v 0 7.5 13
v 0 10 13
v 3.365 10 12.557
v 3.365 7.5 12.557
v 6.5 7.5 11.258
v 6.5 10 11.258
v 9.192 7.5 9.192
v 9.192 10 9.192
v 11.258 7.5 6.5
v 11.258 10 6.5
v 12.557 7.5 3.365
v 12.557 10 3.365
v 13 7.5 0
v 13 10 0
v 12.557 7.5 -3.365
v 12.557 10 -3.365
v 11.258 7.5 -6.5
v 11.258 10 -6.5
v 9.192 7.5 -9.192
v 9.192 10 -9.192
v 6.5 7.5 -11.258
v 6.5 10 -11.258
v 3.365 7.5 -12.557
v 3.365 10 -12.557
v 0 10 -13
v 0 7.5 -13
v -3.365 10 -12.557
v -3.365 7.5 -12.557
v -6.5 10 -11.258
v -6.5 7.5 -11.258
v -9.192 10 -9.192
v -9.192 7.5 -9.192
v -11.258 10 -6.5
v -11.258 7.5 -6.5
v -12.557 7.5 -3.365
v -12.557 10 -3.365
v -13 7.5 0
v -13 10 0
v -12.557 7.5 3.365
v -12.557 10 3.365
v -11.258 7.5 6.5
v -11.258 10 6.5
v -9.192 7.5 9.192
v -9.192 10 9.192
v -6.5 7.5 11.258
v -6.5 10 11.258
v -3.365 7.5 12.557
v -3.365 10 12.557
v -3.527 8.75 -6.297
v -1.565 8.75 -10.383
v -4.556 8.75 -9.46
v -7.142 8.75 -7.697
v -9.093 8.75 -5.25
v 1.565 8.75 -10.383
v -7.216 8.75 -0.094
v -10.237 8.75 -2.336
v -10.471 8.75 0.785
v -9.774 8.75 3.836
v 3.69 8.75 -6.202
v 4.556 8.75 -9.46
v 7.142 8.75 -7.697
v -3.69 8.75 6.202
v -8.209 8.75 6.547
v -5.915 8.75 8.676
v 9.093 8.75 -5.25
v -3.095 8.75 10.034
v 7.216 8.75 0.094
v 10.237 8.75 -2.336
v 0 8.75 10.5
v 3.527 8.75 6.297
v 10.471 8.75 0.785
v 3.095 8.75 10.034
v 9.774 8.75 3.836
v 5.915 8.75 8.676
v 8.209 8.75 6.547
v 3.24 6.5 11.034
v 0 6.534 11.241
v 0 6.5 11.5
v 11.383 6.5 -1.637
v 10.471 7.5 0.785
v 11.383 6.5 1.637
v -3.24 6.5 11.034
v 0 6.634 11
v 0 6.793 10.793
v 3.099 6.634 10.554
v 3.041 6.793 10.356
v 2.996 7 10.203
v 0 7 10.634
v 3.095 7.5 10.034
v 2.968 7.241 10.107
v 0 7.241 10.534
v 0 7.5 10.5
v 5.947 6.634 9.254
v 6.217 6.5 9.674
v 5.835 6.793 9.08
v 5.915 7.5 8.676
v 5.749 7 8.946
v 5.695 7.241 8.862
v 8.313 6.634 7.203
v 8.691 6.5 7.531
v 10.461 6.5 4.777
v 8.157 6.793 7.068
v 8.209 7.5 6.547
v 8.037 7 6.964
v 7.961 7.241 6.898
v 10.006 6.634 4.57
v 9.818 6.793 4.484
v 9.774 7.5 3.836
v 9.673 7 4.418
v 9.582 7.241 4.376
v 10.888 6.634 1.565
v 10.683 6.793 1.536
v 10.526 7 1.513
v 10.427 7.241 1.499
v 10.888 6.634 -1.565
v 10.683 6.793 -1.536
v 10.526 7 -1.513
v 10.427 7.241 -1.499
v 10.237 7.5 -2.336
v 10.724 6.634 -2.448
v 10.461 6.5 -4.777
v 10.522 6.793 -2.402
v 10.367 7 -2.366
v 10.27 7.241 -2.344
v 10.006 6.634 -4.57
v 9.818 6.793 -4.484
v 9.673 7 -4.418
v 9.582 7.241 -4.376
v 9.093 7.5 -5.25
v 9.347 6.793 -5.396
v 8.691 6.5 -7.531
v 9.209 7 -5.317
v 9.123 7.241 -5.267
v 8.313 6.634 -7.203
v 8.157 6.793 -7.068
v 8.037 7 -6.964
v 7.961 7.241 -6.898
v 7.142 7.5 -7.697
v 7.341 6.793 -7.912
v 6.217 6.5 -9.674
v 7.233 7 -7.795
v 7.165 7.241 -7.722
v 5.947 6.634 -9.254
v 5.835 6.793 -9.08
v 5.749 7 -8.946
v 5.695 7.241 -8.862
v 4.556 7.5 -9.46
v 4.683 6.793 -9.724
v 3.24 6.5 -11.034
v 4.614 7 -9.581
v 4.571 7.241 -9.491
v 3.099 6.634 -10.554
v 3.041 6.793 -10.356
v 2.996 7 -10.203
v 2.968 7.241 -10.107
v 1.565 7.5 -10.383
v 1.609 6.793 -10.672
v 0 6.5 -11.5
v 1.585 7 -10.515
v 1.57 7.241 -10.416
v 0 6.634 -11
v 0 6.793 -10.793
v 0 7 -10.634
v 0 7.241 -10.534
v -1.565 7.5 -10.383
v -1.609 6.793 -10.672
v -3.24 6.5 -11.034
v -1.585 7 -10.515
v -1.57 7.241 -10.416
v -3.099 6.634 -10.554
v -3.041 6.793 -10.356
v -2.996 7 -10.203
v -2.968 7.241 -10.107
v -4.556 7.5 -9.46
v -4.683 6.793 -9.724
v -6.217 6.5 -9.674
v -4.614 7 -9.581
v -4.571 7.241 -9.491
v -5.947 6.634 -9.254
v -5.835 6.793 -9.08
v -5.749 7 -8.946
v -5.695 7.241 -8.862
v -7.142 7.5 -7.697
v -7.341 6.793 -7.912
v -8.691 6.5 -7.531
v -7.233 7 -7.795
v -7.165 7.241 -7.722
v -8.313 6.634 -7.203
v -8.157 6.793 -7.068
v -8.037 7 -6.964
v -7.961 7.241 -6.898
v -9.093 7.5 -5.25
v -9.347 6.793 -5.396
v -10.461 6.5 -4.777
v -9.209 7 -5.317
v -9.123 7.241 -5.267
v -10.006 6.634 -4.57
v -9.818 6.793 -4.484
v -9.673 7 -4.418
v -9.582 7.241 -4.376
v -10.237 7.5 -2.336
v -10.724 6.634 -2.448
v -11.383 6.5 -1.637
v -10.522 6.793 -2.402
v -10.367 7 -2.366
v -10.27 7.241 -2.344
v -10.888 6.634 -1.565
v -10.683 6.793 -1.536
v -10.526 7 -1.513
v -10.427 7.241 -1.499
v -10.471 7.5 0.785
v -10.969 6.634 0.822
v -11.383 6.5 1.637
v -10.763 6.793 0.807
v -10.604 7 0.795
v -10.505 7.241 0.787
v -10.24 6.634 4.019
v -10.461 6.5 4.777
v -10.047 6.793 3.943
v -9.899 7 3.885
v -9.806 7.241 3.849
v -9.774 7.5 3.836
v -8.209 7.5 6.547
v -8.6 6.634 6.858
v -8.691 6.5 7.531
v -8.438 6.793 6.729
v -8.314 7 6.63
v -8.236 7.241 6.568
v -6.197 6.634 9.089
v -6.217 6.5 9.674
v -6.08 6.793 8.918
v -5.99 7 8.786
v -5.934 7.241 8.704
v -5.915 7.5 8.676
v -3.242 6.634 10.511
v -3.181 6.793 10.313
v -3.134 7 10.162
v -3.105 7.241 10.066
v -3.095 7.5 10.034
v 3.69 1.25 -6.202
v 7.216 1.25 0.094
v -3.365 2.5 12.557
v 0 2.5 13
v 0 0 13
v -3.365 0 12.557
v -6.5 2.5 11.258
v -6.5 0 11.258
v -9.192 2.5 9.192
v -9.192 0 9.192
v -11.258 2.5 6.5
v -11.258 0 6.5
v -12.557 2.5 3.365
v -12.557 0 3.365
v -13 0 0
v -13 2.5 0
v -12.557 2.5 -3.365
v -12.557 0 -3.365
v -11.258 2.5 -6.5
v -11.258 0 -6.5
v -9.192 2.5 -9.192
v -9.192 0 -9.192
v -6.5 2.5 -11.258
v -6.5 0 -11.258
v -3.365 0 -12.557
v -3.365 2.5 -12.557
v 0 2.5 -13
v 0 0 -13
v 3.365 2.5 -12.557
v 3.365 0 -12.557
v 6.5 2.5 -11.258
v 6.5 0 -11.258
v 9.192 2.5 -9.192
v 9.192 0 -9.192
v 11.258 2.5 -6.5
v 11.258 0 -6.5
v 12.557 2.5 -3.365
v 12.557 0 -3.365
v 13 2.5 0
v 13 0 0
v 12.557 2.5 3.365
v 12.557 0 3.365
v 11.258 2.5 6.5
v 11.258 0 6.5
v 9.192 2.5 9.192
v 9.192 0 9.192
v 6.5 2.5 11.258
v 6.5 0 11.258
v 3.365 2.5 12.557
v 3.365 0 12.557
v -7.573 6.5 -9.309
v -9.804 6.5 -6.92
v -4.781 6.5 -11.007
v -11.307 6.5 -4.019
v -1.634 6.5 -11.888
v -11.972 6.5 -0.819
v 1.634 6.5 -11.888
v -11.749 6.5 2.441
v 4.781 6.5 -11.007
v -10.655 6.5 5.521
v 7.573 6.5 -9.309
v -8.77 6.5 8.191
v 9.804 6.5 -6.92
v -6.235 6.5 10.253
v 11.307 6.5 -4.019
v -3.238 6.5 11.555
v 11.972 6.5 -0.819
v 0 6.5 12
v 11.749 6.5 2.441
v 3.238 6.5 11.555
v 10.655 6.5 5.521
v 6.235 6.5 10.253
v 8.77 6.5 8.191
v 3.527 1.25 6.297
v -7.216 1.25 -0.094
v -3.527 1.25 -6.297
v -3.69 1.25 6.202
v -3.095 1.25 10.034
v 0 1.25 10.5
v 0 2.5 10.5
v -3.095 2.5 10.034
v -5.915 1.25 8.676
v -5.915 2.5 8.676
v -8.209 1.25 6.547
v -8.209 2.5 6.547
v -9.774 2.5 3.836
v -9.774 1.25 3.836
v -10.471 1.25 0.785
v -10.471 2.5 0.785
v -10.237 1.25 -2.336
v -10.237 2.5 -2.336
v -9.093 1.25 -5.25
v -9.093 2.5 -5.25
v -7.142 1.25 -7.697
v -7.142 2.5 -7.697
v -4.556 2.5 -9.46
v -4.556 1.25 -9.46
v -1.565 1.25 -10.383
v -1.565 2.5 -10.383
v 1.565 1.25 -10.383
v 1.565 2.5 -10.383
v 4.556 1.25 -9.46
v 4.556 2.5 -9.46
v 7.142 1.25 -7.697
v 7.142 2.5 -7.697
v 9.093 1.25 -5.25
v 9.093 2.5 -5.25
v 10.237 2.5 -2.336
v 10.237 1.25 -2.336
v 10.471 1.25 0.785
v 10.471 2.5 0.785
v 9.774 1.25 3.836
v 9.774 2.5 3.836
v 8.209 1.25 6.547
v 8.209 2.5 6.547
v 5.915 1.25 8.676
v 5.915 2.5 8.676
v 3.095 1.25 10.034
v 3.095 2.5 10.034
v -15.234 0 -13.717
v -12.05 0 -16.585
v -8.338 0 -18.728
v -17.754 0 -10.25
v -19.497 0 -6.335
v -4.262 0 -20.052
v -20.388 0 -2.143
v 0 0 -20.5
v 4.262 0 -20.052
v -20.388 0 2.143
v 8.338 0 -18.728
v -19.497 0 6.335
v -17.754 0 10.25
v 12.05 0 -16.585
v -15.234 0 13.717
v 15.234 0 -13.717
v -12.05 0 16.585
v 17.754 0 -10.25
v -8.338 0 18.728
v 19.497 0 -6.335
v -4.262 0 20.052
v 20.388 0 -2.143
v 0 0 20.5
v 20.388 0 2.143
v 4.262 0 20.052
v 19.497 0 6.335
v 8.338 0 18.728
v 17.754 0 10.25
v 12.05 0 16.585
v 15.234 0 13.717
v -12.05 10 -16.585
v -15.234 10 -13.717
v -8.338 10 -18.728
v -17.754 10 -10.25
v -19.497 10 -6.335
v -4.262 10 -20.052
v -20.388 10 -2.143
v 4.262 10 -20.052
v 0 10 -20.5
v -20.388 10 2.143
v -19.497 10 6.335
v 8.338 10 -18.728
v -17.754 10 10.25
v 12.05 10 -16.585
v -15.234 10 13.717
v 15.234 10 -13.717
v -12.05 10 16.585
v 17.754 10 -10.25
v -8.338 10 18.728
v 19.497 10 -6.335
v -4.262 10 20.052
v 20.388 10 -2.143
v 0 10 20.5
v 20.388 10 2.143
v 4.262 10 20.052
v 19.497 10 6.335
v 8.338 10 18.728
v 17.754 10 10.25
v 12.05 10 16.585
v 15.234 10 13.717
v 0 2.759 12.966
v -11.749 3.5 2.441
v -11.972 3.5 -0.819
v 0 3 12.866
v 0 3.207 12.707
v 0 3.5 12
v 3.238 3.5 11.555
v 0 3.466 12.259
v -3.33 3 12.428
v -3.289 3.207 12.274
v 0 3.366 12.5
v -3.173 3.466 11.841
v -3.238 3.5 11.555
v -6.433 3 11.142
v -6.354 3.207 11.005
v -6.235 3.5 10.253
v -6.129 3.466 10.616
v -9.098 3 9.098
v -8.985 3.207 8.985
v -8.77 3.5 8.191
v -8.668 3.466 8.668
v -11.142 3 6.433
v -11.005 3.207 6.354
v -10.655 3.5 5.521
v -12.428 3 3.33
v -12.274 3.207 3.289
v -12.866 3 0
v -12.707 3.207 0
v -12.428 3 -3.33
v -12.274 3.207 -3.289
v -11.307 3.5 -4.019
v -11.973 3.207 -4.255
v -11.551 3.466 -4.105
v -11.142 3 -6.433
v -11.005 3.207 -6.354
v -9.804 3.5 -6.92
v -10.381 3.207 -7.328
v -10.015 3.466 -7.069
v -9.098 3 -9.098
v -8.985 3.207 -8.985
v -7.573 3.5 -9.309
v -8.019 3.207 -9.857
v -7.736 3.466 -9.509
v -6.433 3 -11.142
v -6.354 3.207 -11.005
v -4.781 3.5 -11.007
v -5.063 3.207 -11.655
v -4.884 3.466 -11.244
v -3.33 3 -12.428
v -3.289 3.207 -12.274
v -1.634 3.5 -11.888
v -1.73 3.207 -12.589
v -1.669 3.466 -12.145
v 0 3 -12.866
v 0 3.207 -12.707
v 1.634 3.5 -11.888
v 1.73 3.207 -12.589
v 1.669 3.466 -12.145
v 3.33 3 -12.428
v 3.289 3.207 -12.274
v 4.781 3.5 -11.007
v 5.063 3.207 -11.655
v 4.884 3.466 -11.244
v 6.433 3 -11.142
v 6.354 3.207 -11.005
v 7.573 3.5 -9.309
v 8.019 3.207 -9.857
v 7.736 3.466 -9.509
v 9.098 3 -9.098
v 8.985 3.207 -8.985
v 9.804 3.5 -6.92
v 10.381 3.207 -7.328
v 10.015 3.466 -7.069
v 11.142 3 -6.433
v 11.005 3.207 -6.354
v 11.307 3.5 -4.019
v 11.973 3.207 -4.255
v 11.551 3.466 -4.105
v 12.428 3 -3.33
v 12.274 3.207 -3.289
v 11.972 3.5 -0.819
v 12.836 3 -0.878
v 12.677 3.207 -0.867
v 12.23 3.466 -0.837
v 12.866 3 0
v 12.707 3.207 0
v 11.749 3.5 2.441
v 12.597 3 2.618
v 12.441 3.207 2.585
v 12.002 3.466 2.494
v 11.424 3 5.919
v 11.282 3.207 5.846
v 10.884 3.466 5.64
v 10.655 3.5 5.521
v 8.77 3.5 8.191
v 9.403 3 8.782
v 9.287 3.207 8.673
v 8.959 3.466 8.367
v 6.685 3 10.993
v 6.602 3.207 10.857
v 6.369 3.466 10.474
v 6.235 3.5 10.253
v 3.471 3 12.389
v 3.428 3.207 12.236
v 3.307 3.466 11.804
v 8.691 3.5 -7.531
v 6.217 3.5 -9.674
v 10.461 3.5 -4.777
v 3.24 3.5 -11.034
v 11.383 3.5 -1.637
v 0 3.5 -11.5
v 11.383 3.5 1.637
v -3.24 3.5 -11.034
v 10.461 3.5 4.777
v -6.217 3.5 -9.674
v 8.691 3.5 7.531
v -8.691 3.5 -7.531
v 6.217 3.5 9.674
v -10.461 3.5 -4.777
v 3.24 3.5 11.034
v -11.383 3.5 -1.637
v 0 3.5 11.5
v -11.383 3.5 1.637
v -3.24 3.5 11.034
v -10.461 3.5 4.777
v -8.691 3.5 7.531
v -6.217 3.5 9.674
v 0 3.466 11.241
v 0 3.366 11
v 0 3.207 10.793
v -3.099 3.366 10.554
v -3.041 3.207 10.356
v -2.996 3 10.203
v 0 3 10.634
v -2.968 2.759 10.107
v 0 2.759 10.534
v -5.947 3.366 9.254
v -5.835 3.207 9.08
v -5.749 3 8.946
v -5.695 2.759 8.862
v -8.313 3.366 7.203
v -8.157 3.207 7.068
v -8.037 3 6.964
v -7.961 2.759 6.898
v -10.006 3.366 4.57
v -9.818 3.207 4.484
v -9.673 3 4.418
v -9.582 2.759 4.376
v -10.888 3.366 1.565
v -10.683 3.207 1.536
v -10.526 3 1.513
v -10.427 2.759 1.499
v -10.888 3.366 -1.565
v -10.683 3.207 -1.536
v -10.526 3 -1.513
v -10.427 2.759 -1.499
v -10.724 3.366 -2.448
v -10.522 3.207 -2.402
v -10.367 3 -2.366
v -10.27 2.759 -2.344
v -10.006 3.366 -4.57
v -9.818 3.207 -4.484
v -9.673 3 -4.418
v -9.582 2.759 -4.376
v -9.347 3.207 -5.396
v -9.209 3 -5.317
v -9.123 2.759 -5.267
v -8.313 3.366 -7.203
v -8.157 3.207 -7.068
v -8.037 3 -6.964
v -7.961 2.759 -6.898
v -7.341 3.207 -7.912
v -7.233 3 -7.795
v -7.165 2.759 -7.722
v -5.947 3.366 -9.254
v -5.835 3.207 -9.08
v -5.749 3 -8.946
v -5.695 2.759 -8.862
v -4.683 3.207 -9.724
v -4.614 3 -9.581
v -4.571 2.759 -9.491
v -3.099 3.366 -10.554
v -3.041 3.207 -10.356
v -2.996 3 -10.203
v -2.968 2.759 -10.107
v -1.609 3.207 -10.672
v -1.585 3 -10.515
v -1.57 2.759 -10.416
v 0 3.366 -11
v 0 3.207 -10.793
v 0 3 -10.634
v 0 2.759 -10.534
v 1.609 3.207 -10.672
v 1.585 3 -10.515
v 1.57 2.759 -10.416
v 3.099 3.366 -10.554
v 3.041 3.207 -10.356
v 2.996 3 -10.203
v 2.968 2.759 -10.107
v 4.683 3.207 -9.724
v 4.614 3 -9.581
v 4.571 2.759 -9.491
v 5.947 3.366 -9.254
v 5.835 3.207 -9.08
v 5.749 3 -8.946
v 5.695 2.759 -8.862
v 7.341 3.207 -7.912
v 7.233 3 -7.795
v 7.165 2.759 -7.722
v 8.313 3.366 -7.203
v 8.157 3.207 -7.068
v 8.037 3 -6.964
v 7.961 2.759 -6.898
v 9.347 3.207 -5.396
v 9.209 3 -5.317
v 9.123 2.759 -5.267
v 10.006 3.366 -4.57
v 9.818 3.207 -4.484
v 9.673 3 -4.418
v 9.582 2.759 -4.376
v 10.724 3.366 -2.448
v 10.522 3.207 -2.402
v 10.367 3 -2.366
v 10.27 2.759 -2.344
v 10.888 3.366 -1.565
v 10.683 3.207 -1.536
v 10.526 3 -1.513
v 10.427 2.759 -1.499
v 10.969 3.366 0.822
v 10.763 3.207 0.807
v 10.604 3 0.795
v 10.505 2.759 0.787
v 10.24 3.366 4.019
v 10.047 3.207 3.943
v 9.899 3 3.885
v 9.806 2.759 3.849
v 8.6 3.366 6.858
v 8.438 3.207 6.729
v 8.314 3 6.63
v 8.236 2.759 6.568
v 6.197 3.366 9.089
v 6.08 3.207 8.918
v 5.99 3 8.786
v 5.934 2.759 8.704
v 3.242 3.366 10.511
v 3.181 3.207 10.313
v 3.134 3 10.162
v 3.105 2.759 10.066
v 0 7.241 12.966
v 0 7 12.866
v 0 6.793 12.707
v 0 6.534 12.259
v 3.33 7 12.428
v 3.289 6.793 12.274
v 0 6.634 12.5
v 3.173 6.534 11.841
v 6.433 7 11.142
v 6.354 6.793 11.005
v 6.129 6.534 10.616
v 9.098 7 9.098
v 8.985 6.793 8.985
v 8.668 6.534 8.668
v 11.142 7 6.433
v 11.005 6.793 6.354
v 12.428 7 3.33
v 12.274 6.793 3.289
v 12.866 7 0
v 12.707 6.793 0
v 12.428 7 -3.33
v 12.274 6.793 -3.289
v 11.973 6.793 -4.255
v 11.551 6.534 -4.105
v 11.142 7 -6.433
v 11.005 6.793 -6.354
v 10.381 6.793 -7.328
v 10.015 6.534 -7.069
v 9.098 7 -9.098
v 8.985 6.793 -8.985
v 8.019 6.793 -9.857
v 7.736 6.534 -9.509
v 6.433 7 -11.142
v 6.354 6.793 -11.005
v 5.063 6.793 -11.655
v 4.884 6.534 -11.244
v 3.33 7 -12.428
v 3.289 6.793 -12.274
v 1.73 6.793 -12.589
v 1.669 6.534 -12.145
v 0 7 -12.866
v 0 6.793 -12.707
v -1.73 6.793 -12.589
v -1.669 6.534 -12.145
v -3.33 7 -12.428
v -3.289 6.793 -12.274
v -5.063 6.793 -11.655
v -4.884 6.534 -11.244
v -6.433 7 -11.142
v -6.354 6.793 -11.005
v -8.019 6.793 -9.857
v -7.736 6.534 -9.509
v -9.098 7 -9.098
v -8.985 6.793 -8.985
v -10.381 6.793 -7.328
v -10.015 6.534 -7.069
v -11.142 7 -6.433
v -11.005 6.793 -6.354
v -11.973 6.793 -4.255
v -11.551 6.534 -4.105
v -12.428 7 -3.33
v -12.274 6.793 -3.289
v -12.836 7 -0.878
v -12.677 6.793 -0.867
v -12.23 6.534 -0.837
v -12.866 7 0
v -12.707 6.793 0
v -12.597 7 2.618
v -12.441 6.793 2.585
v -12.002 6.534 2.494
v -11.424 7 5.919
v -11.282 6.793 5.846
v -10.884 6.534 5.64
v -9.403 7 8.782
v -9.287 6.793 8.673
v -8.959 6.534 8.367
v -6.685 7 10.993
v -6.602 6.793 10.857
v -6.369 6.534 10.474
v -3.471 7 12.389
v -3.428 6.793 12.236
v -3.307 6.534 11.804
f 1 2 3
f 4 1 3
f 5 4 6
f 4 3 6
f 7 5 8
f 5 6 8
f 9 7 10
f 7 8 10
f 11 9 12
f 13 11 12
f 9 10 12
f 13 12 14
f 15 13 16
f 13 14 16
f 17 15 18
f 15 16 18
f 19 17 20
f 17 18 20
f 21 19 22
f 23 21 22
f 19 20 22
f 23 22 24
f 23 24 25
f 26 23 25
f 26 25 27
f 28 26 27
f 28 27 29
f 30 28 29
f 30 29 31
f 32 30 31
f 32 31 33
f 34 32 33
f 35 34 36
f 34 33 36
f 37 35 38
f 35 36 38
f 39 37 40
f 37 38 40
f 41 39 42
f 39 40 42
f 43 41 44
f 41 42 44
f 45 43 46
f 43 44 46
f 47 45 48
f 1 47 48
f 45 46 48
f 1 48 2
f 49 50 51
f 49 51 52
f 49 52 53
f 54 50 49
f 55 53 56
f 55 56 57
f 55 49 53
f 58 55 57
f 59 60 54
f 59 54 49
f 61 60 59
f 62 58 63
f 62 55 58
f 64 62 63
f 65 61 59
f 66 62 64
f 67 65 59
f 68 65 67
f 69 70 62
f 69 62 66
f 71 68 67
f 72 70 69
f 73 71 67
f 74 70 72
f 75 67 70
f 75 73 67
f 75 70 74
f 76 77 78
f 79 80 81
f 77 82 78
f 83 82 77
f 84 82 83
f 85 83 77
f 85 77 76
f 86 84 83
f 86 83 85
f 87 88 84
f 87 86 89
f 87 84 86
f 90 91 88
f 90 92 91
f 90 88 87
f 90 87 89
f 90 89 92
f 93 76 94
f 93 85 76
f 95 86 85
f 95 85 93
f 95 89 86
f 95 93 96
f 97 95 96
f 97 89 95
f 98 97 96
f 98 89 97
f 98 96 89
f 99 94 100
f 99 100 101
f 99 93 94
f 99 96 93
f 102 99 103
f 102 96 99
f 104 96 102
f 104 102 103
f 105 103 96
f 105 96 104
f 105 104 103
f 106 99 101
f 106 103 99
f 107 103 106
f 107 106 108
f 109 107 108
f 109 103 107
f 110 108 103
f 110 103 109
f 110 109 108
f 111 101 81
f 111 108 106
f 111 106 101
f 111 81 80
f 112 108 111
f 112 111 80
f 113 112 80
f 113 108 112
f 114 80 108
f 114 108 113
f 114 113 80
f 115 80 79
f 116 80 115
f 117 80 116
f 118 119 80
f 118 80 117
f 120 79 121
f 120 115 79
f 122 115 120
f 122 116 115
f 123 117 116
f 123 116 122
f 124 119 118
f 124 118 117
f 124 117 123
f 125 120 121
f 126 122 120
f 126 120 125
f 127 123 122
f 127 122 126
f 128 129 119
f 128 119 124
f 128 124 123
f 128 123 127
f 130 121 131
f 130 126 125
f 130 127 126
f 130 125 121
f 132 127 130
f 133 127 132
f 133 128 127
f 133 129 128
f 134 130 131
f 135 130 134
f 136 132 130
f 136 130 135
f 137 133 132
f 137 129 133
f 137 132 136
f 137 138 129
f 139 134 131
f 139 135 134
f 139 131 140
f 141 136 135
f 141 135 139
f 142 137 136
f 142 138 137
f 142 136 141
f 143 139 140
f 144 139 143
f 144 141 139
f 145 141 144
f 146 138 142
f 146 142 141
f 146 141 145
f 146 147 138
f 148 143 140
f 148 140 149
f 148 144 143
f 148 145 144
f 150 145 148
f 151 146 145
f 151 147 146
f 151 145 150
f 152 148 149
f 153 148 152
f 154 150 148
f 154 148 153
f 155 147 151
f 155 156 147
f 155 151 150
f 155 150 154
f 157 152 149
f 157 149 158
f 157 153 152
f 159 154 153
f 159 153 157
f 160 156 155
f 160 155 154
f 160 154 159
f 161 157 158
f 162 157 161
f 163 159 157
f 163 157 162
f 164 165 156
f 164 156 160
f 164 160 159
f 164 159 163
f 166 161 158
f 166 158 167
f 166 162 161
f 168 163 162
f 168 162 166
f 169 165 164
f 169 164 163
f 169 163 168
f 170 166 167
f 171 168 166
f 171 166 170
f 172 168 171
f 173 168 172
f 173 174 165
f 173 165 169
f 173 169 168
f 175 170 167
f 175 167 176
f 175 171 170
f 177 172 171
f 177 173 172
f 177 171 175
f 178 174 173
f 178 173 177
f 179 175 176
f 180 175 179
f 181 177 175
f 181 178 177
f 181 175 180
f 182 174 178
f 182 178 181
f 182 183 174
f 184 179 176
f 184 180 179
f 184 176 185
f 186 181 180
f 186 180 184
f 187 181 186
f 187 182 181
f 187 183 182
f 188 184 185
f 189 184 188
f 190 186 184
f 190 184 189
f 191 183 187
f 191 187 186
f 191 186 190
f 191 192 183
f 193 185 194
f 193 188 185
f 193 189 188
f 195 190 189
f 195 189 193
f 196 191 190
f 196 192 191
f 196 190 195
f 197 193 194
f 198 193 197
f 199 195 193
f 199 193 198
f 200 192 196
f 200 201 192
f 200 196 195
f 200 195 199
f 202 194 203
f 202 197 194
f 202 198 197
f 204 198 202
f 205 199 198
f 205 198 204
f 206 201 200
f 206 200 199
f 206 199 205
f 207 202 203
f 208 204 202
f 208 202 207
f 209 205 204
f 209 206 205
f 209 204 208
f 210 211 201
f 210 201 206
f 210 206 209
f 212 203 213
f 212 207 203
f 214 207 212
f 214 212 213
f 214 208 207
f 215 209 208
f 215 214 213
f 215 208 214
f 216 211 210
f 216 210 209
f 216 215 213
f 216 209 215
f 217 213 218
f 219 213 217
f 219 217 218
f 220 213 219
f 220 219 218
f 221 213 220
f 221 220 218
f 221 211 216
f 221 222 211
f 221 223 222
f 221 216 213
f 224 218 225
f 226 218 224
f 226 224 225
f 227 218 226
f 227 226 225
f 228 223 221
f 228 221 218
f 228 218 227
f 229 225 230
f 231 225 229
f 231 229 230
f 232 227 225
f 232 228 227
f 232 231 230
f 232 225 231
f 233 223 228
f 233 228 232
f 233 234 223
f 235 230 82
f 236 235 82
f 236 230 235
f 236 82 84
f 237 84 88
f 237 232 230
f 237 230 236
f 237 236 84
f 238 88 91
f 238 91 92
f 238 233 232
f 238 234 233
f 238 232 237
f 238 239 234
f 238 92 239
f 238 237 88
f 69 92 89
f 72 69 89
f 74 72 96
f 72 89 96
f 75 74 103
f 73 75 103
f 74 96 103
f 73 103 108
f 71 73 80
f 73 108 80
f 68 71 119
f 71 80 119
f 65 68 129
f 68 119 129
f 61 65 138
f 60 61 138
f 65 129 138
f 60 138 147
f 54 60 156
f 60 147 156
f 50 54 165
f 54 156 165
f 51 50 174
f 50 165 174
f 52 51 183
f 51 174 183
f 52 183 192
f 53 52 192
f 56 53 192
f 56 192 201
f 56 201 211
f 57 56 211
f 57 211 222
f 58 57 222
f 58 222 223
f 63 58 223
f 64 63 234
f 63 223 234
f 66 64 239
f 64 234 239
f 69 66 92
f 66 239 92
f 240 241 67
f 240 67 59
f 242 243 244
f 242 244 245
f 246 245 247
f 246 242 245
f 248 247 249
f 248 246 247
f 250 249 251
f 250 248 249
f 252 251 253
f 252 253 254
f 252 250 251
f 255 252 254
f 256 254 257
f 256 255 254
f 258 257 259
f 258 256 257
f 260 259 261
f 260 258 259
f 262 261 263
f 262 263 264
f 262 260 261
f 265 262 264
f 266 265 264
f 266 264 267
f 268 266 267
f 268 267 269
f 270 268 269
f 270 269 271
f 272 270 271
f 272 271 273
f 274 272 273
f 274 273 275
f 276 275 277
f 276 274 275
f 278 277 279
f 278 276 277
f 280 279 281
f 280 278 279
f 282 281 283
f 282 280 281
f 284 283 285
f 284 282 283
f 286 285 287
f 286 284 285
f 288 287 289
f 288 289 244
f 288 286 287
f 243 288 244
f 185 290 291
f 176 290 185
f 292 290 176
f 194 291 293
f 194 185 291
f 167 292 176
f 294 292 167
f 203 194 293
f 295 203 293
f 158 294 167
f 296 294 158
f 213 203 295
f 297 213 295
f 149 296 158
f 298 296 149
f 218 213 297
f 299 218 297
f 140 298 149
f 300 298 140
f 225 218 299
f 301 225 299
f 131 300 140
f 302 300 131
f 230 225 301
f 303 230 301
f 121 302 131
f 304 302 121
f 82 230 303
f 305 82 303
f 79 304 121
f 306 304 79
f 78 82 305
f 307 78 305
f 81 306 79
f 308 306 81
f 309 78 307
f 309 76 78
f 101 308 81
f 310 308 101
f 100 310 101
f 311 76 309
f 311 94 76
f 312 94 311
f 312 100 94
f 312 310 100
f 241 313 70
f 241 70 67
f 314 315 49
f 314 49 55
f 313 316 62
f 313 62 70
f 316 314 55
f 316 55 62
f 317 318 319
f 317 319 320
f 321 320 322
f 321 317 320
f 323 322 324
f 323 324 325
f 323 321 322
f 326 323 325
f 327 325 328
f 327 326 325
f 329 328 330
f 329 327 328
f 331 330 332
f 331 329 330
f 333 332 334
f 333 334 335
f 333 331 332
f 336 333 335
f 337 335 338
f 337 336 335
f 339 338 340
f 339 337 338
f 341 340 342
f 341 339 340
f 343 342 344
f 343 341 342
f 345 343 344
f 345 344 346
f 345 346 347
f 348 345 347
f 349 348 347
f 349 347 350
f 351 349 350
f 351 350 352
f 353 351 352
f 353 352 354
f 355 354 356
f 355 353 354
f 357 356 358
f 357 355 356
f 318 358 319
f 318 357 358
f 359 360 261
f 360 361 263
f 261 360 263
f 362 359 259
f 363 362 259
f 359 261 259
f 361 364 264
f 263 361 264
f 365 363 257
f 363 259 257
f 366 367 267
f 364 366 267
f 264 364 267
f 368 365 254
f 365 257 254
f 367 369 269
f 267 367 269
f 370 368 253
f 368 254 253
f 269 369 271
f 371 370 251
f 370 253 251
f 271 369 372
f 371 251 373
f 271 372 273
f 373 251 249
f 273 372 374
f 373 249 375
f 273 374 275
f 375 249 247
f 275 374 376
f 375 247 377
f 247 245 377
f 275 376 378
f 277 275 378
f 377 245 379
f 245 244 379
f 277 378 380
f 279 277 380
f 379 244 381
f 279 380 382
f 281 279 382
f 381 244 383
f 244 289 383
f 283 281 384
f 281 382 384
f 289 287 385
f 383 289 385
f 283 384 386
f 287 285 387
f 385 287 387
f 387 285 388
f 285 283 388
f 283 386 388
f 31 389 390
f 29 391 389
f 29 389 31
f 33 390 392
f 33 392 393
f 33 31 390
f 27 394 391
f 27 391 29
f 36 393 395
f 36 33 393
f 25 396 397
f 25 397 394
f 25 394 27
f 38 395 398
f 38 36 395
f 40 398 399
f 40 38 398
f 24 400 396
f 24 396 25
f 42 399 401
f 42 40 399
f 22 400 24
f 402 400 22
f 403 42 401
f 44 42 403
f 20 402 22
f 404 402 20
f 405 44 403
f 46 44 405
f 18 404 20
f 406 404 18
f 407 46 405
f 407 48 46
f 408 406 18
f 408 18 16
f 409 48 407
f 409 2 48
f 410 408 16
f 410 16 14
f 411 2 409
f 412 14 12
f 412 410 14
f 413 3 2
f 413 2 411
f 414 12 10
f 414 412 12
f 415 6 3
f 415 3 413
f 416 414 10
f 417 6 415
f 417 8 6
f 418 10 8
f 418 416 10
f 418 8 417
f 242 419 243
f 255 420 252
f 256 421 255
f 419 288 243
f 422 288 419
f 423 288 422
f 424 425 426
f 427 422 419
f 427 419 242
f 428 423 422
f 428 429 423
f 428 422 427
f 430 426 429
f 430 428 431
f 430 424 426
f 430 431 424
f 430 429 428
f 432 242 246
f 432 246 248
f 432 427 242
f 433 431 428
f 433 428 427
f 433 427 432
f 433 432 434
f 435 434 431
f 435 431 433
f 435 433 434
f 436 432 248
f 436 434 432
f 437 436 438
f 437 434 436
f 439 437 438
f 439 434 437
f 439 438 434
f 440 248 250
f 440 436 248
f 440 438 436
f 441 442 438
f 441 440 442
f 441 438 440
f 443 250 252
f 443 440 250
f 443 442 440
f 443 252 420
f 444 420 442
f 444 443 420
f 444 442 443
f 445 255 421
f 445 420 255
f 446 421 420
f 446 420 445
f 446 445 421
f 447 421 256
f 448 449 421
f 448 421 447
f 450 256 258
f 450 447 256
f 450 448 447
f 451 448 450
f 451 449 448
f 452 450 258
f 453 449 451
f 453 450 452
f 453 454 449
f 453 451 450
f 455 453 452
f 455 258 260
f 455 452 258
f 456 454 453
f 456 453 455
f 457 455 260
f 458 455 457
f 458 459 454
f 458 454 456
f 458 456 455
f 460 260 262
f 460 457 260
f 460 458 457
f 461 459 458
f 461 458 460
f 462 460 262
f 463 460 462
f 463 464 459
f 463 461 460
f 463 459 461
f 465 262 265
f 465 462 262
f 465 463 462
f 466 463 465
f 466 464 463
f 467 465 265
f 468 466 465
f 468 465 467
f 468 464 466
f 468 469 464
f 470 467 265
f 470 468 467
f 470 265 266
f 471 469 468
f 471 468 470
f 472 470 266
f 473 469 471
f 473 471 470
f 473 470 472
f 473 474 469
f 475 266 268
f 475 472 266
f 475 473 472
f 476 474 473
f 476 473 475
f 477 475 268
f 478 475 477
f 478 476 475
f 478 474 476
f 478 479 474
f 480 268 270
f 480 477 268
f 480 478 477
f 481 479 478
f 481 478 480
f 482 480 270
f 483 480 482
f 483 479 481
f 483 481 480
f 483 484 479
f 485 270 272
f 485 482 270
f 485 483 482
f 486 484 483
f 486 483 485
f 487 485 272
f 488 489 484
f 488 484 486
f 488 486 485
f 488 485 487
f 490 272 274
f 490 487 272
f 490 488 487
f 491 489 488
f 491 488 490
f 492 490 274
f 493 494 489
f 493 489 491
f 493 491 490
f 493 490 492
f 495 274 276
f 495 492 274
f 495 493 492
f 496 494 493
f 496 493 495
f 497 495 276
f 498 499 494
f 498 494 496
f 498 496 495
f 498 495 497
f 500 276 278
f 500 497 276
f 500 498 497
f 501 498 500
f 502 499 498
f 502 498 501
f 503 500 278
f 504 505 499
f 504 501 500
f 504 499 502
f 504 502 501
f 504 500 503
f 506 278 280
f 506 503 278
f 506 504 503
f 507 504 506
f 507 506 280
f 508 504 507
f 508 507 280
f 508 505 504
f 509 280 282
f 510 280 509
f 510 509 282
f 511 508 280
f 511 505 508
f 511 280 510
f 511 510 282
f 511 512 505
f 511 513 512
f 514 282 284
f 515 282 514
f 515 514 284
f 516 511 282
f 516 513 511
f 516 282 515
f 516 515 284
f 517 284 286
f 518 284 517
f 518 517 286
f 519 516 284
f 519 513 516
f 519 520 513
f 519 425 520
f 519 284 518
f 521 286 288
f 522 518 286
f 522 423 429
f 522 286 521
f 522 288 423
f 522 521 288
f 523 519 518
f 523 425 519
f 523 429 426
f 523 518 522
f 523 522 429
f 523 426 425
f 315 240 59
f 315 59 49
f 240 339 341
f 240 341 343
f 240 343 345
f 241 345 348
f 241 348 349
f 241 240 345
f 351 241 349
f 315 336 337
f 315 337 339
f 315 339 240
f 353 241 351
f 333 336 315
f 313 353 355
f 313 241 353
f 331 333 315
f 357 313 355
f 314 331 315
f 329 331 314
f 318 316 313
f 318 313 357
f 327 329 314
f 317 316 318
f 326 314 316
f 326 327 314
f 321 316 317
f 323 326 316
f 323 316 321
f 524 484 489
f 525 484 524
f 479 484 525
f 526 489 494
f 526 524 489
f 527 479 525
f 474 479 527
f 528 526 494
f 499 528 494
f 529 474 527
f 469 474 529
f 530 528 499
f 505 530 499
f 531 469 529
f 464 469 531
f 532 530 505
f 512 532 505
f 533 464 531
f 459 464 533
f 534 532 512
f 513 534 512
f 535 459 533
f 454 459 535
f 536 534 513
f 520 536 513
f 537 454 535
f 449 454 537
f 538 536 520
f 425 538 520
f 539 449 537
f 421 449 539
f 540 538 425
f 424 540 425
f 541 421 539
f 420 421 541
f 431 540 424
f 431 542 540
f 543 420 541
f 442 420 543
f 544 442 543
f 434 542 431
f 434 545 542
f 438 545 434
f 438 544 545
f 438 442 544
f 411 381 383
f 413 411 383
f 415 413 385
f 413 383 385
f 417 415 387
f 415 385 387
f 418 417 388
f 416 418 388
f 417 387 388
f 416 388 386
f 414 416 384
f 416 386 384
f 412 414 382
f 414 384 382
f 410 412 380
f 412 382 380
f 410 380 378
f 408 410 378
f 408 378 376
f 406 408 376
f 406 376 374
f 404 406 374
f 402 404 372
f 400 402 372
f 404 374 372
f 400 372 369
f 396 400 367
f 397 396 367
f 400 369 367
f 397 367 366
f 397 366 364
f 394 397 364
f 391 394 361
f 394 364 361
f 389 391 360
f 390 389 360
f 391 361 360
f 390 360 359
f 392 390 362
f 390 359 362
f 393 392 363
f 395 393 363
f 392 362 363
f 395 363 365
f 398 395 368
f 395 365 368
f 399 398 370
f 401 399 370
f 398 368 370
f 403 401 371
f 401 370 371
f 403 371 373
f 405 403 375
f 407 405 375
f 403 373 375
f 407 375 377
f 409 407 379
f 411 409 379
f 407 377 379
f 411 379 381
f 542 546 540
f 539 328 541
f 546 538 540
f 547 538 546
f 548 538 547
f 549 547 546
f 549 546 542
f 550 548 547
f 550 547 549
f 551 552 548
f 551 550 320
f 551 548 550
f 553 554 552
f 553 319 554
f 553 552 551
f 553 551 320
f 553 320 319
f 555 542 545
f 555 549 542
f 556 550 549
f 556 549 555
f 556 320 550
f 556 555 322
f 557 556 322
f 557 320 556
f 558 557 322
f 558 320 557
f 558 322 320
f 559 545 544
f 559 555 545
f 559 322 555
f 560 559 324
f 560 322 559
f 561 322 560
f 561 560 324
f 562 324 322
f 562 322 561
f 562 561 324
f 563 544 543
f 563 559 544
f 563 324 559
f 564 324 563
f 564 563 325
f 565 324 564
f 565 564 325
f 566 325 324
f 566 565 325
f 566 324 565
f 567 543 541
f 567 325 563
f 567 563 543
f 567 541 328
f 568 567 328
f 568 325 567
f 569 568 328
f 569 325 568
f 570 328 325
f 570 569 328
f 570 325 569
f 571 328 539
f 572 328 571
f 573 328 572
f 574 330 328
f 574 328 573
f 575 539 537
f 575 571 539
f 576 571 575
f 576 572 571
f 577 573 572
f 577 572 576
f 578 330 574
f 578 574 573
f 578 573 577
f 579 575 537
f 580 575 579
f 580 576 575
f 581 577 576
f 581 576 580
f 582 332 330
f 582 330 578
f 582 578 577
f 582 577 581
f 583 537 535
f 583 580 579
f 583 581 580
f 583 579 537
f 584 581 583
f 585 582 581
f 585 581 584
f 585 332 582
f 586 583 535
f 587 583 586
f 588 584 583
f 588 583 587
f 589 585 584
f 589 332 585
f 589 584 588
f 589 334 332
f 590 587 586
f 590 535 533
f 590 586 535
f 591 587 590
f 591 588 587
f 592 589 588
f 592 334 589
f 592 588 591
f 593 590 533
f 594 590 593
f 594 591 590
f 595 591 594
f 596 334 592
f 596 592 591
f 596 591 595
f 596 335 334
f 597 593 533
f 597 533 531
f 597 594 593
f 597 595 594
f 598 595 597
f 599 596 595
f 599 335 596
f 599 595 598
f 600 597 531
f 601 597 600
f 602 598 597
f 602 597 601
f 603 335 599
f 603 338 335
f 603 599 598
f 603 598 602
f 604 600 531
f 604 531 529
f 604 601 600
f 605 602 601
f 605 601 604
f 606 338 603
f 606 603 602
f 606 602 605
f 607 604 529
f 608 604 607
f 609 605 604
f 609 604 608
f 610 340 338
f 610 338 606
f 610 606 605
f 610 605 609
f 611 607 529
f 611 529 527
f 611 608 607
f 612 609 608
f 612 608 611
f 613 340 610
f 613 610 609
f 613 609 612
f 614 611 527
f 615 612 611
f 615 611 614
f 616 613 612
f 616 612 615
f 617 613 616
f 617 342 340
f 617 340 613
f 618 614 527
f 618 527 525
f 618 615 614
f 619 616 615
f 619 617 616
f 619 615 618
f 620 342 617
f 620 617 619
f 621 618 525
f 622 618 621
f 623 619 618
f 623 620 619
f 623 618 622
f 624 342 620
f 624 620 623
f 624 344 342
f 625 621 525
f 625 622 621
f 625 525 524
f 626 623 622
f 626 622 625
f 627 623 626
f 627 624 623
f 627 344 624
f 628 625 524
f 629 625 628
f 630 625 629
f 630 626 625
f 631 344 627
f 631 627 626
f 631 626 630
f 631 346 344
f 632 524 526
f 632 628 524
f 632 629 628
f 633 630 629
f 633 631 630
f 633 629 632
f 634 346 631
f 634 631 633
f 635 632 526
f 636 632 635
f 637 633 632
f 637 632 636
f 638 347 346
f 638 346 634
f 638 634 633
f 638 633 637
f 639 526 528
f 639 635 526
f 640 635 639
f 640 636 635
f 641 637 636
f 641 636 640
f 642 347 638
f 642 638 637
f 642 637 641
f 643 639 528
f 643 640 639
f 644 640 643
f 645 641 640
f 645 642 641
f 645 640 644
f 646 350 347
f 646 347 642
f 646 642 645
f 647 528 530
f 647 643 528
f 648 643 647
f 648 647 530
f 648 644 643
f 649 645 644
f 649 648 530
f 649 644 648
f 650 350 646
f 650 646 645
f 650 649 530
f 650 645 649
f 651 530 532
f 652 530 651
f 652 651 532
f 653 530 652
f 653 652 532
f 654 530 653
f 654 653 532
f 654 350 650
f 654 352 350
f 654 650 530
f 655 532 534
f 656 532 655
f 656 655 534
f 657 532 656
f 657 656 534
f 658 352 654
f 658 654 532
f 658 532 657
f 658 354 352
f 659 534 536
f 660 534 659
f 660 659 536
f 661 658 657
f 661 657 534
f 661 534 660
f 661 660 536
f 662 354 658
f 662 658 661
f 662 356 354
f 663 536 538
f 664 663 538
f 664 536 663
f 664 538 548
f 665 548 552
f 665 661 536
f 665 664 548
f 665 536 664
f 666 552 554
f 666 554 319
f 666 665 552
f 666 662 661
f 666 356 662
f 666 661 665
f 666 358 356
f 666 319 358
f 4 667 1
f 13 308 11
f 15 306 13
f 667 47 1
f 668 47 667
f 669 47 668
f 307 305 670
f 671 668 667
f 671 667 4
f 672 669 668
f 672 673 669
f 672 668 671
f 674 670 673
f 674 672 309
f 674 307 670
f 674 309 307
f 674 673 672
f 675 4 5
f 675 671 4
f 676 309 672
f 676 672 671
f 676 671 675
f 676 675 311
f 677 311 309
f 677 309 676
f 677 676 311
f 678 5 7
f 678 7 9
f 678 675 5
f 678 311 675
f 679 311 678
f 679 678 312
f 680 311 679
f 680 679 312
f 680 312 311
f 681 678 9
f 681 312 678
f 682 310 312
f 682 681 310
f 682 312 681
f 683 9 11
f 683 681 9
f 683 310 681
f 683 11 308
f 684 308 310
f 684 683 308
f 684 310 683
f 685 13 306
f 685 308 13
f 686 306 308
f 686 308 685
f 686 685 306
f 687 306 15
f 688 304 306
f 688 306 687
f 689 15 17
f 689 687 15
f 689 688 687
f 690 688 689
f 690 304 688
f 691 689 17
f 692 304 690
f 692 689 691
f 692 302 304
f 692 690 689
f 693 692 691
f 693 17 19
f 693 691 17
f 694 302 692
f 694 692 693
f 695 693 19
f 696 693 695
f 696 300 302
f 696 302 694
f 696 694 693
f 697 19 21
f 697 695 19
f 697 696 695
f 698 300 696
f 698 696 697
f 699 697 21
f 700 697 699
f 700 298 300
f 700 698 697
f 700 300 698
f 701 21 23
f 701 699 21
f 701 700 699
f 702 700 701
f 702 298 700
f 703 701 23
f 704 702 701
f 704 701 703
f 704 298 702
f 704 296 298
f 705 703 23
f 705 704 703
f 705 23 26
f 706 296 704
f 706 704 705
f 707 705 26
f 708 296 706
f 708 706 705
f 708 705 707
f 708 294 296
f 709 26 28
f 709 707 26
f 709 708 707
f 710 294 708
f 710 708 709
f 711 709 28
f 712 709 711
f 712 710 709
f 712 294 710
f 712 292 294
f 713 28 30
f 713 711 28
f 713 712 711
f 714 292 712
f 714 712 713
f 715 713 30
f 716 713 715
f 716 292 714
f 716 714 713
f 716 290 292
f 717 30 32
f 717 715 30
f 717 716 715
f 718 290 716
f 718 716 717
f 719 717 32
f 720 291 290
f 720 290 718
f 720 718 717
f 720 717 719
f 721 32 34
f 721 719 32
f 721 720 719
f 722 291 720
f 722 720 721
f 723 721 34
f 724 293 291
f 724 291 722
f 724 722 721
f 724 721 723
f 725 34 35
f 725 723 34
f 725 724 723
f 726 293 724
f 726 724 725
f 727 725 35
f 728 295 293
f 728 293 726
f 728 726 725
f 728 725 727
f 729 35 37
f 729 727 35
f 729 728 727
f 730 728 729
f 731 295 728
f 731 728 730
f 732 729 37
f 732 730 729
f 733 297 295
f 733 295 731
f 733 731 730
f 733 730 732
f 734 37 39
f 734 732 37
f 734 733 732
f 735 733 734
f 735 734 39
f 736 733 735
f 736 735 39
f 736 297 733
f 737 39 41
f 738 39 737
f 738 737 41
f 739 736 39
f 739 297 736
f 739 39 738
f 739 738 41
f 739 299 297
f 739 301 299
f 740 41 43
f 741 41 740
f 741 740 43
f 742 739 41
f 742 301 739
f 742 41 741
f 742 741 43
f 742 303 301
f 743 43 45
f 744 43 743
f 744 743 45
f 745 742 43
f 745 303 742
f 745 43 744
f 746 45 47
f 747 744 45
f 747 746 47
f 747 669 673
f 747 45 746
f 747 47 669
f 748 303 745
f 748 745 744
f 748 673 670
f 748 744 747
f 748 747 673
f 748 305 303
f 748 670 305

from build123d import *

# Parameters (mm, degrees)
SKETCH1_R               = 20.5
BOSS_EXTRUDE1_DEPTH     = 10
SKETCH2_R               = 13
CUT_EXTRUDE1_DEPTH      = 3.5
CUT_EXTRUDE2_START      = -3.5
SKETCH3_R               = 13
CUT_EXTRUDE2_DEPTH      = 3.5
SKETCH5_R               = 10.5
BOSS_EXTRUDE2_DEPTH     = 2.25
BOSS_EXTRUDE3_START     = 2.25
SKETCH6_R               = 10.5
BOSS_EXTRUDE3_DEPTH     = 2.25
CUT_EXTRUDE3_DEPTH      = 30.711109033
CUT_EXTRUDE3_DEPTH_BACK = 30.711109033
FILLET1_R               = 1
FILLET2_R               = 1


with BuildPart() as part:
    # Sketch1 → Boss-Extrude1 (new body)
    with BuildSketch(Plane(origin=(0, 0, 0), x_dir=(1, 0, 0), z_dir=(0, 1, 0))):
        with Locations(Location((0, 0, 0), (0, 0, 270))):
            Circle(SKETCH1_R)
    extrude(amount=BOSS_EXTRUDE1_DEPTH)

    # Sketch2 → Cut-Extrude1 (cut)
    with BuildSketch(Plane(origin=(0, 10, 0), x_dir=(1, 0, 0), z_dir=(0, 1, 0))):
        with Locations(Location((0, 0, 0), (0, 0, 270))):
            Circle(SKETCH2_R)
    extrude(amount=-CUT_EXTRUDE1_DEPTH, mode=Mode.SUBTRACT)

    # Sketch3 → Cut-Extrude2 (cut)
    with BuildSketch(Plane.XZ.offset(CUT_EXTRUDE2_START)):
        with Locations(Location((0, 0, 0), (0, 0, 90))):
            Circle(SKETCH3_R)
    extrude(amount=CUT_EXTRUDE2_DEPTH, mode=Mode.SUBTRACT)

    # Sketch5 → Boss-Extrude2 (add)
    with BuildSketch(Plane(origin=(0, 6.5, 0), x_dir=(1, 0, 0), z_dir=(0, 1, 0))):
        with Locations(Location((0, 0, 0), (0, 0, 270))):
            Circle(SKETCH5_R)
    extrude(amount=BOSS_EXTRUDE2_DEPTH)

    # Sketch6 → Boss-Extrude3 (add)
    with BuildSketch(Plane.XZ.offset(-3.5).offset(BOSS_EXTRUDE3_START)):
        with Locations(Location((0, 0, 0), (0, 0, 90))):
            Circle(SKETCH6_R)
    extrude(amount=-BOSS_EXTRUDE3_DEPTH)

    # Sketch4 → Cut-Extrude3 (cut, two sides: drawn at the far end of the back side and taken through both)
    with BuildSketch(Plane(origin=(0, 6.5, 0), x_dir=(1, 0, 0), z_dir=(0, 1, 0)).offset(-CUT_EXTRUDE3_DEPTH_BACK)):
        Polygon((3.689639098, 6.202410552), (-3.526625554, 6.296526466), (-7.216264652, 0.094115913), (-3.689639098, -6.202410552), (3.526625554, -6.296526466), (7.216264652, -0.094115913), align=None)
    extrude(amount=CUT_EXTRUDE3_DEPTH + CUT_EXTRUDE3_DEPTH_BACK, mode=Mode.SUBTRACT)

    # Fillet1
    fillet1_edges = [part.edges().sort_by_distance(p)[0] for p in [
        (0, 3.5, -13),
        (0, 6.5, -13),
    ]]
    fillet(fillet1_edges, radius=FILLET1_R)

    # Fillet2
    fillet2_edges = [part.edges().sort_by_distance(p)[0] for p in [
        (0, 6.5, -10.5),
        (0, 3.5, -10.5),
    ]]
    fillet(fillet2_edges, radius=FILLET2_R)


solid = part.part
